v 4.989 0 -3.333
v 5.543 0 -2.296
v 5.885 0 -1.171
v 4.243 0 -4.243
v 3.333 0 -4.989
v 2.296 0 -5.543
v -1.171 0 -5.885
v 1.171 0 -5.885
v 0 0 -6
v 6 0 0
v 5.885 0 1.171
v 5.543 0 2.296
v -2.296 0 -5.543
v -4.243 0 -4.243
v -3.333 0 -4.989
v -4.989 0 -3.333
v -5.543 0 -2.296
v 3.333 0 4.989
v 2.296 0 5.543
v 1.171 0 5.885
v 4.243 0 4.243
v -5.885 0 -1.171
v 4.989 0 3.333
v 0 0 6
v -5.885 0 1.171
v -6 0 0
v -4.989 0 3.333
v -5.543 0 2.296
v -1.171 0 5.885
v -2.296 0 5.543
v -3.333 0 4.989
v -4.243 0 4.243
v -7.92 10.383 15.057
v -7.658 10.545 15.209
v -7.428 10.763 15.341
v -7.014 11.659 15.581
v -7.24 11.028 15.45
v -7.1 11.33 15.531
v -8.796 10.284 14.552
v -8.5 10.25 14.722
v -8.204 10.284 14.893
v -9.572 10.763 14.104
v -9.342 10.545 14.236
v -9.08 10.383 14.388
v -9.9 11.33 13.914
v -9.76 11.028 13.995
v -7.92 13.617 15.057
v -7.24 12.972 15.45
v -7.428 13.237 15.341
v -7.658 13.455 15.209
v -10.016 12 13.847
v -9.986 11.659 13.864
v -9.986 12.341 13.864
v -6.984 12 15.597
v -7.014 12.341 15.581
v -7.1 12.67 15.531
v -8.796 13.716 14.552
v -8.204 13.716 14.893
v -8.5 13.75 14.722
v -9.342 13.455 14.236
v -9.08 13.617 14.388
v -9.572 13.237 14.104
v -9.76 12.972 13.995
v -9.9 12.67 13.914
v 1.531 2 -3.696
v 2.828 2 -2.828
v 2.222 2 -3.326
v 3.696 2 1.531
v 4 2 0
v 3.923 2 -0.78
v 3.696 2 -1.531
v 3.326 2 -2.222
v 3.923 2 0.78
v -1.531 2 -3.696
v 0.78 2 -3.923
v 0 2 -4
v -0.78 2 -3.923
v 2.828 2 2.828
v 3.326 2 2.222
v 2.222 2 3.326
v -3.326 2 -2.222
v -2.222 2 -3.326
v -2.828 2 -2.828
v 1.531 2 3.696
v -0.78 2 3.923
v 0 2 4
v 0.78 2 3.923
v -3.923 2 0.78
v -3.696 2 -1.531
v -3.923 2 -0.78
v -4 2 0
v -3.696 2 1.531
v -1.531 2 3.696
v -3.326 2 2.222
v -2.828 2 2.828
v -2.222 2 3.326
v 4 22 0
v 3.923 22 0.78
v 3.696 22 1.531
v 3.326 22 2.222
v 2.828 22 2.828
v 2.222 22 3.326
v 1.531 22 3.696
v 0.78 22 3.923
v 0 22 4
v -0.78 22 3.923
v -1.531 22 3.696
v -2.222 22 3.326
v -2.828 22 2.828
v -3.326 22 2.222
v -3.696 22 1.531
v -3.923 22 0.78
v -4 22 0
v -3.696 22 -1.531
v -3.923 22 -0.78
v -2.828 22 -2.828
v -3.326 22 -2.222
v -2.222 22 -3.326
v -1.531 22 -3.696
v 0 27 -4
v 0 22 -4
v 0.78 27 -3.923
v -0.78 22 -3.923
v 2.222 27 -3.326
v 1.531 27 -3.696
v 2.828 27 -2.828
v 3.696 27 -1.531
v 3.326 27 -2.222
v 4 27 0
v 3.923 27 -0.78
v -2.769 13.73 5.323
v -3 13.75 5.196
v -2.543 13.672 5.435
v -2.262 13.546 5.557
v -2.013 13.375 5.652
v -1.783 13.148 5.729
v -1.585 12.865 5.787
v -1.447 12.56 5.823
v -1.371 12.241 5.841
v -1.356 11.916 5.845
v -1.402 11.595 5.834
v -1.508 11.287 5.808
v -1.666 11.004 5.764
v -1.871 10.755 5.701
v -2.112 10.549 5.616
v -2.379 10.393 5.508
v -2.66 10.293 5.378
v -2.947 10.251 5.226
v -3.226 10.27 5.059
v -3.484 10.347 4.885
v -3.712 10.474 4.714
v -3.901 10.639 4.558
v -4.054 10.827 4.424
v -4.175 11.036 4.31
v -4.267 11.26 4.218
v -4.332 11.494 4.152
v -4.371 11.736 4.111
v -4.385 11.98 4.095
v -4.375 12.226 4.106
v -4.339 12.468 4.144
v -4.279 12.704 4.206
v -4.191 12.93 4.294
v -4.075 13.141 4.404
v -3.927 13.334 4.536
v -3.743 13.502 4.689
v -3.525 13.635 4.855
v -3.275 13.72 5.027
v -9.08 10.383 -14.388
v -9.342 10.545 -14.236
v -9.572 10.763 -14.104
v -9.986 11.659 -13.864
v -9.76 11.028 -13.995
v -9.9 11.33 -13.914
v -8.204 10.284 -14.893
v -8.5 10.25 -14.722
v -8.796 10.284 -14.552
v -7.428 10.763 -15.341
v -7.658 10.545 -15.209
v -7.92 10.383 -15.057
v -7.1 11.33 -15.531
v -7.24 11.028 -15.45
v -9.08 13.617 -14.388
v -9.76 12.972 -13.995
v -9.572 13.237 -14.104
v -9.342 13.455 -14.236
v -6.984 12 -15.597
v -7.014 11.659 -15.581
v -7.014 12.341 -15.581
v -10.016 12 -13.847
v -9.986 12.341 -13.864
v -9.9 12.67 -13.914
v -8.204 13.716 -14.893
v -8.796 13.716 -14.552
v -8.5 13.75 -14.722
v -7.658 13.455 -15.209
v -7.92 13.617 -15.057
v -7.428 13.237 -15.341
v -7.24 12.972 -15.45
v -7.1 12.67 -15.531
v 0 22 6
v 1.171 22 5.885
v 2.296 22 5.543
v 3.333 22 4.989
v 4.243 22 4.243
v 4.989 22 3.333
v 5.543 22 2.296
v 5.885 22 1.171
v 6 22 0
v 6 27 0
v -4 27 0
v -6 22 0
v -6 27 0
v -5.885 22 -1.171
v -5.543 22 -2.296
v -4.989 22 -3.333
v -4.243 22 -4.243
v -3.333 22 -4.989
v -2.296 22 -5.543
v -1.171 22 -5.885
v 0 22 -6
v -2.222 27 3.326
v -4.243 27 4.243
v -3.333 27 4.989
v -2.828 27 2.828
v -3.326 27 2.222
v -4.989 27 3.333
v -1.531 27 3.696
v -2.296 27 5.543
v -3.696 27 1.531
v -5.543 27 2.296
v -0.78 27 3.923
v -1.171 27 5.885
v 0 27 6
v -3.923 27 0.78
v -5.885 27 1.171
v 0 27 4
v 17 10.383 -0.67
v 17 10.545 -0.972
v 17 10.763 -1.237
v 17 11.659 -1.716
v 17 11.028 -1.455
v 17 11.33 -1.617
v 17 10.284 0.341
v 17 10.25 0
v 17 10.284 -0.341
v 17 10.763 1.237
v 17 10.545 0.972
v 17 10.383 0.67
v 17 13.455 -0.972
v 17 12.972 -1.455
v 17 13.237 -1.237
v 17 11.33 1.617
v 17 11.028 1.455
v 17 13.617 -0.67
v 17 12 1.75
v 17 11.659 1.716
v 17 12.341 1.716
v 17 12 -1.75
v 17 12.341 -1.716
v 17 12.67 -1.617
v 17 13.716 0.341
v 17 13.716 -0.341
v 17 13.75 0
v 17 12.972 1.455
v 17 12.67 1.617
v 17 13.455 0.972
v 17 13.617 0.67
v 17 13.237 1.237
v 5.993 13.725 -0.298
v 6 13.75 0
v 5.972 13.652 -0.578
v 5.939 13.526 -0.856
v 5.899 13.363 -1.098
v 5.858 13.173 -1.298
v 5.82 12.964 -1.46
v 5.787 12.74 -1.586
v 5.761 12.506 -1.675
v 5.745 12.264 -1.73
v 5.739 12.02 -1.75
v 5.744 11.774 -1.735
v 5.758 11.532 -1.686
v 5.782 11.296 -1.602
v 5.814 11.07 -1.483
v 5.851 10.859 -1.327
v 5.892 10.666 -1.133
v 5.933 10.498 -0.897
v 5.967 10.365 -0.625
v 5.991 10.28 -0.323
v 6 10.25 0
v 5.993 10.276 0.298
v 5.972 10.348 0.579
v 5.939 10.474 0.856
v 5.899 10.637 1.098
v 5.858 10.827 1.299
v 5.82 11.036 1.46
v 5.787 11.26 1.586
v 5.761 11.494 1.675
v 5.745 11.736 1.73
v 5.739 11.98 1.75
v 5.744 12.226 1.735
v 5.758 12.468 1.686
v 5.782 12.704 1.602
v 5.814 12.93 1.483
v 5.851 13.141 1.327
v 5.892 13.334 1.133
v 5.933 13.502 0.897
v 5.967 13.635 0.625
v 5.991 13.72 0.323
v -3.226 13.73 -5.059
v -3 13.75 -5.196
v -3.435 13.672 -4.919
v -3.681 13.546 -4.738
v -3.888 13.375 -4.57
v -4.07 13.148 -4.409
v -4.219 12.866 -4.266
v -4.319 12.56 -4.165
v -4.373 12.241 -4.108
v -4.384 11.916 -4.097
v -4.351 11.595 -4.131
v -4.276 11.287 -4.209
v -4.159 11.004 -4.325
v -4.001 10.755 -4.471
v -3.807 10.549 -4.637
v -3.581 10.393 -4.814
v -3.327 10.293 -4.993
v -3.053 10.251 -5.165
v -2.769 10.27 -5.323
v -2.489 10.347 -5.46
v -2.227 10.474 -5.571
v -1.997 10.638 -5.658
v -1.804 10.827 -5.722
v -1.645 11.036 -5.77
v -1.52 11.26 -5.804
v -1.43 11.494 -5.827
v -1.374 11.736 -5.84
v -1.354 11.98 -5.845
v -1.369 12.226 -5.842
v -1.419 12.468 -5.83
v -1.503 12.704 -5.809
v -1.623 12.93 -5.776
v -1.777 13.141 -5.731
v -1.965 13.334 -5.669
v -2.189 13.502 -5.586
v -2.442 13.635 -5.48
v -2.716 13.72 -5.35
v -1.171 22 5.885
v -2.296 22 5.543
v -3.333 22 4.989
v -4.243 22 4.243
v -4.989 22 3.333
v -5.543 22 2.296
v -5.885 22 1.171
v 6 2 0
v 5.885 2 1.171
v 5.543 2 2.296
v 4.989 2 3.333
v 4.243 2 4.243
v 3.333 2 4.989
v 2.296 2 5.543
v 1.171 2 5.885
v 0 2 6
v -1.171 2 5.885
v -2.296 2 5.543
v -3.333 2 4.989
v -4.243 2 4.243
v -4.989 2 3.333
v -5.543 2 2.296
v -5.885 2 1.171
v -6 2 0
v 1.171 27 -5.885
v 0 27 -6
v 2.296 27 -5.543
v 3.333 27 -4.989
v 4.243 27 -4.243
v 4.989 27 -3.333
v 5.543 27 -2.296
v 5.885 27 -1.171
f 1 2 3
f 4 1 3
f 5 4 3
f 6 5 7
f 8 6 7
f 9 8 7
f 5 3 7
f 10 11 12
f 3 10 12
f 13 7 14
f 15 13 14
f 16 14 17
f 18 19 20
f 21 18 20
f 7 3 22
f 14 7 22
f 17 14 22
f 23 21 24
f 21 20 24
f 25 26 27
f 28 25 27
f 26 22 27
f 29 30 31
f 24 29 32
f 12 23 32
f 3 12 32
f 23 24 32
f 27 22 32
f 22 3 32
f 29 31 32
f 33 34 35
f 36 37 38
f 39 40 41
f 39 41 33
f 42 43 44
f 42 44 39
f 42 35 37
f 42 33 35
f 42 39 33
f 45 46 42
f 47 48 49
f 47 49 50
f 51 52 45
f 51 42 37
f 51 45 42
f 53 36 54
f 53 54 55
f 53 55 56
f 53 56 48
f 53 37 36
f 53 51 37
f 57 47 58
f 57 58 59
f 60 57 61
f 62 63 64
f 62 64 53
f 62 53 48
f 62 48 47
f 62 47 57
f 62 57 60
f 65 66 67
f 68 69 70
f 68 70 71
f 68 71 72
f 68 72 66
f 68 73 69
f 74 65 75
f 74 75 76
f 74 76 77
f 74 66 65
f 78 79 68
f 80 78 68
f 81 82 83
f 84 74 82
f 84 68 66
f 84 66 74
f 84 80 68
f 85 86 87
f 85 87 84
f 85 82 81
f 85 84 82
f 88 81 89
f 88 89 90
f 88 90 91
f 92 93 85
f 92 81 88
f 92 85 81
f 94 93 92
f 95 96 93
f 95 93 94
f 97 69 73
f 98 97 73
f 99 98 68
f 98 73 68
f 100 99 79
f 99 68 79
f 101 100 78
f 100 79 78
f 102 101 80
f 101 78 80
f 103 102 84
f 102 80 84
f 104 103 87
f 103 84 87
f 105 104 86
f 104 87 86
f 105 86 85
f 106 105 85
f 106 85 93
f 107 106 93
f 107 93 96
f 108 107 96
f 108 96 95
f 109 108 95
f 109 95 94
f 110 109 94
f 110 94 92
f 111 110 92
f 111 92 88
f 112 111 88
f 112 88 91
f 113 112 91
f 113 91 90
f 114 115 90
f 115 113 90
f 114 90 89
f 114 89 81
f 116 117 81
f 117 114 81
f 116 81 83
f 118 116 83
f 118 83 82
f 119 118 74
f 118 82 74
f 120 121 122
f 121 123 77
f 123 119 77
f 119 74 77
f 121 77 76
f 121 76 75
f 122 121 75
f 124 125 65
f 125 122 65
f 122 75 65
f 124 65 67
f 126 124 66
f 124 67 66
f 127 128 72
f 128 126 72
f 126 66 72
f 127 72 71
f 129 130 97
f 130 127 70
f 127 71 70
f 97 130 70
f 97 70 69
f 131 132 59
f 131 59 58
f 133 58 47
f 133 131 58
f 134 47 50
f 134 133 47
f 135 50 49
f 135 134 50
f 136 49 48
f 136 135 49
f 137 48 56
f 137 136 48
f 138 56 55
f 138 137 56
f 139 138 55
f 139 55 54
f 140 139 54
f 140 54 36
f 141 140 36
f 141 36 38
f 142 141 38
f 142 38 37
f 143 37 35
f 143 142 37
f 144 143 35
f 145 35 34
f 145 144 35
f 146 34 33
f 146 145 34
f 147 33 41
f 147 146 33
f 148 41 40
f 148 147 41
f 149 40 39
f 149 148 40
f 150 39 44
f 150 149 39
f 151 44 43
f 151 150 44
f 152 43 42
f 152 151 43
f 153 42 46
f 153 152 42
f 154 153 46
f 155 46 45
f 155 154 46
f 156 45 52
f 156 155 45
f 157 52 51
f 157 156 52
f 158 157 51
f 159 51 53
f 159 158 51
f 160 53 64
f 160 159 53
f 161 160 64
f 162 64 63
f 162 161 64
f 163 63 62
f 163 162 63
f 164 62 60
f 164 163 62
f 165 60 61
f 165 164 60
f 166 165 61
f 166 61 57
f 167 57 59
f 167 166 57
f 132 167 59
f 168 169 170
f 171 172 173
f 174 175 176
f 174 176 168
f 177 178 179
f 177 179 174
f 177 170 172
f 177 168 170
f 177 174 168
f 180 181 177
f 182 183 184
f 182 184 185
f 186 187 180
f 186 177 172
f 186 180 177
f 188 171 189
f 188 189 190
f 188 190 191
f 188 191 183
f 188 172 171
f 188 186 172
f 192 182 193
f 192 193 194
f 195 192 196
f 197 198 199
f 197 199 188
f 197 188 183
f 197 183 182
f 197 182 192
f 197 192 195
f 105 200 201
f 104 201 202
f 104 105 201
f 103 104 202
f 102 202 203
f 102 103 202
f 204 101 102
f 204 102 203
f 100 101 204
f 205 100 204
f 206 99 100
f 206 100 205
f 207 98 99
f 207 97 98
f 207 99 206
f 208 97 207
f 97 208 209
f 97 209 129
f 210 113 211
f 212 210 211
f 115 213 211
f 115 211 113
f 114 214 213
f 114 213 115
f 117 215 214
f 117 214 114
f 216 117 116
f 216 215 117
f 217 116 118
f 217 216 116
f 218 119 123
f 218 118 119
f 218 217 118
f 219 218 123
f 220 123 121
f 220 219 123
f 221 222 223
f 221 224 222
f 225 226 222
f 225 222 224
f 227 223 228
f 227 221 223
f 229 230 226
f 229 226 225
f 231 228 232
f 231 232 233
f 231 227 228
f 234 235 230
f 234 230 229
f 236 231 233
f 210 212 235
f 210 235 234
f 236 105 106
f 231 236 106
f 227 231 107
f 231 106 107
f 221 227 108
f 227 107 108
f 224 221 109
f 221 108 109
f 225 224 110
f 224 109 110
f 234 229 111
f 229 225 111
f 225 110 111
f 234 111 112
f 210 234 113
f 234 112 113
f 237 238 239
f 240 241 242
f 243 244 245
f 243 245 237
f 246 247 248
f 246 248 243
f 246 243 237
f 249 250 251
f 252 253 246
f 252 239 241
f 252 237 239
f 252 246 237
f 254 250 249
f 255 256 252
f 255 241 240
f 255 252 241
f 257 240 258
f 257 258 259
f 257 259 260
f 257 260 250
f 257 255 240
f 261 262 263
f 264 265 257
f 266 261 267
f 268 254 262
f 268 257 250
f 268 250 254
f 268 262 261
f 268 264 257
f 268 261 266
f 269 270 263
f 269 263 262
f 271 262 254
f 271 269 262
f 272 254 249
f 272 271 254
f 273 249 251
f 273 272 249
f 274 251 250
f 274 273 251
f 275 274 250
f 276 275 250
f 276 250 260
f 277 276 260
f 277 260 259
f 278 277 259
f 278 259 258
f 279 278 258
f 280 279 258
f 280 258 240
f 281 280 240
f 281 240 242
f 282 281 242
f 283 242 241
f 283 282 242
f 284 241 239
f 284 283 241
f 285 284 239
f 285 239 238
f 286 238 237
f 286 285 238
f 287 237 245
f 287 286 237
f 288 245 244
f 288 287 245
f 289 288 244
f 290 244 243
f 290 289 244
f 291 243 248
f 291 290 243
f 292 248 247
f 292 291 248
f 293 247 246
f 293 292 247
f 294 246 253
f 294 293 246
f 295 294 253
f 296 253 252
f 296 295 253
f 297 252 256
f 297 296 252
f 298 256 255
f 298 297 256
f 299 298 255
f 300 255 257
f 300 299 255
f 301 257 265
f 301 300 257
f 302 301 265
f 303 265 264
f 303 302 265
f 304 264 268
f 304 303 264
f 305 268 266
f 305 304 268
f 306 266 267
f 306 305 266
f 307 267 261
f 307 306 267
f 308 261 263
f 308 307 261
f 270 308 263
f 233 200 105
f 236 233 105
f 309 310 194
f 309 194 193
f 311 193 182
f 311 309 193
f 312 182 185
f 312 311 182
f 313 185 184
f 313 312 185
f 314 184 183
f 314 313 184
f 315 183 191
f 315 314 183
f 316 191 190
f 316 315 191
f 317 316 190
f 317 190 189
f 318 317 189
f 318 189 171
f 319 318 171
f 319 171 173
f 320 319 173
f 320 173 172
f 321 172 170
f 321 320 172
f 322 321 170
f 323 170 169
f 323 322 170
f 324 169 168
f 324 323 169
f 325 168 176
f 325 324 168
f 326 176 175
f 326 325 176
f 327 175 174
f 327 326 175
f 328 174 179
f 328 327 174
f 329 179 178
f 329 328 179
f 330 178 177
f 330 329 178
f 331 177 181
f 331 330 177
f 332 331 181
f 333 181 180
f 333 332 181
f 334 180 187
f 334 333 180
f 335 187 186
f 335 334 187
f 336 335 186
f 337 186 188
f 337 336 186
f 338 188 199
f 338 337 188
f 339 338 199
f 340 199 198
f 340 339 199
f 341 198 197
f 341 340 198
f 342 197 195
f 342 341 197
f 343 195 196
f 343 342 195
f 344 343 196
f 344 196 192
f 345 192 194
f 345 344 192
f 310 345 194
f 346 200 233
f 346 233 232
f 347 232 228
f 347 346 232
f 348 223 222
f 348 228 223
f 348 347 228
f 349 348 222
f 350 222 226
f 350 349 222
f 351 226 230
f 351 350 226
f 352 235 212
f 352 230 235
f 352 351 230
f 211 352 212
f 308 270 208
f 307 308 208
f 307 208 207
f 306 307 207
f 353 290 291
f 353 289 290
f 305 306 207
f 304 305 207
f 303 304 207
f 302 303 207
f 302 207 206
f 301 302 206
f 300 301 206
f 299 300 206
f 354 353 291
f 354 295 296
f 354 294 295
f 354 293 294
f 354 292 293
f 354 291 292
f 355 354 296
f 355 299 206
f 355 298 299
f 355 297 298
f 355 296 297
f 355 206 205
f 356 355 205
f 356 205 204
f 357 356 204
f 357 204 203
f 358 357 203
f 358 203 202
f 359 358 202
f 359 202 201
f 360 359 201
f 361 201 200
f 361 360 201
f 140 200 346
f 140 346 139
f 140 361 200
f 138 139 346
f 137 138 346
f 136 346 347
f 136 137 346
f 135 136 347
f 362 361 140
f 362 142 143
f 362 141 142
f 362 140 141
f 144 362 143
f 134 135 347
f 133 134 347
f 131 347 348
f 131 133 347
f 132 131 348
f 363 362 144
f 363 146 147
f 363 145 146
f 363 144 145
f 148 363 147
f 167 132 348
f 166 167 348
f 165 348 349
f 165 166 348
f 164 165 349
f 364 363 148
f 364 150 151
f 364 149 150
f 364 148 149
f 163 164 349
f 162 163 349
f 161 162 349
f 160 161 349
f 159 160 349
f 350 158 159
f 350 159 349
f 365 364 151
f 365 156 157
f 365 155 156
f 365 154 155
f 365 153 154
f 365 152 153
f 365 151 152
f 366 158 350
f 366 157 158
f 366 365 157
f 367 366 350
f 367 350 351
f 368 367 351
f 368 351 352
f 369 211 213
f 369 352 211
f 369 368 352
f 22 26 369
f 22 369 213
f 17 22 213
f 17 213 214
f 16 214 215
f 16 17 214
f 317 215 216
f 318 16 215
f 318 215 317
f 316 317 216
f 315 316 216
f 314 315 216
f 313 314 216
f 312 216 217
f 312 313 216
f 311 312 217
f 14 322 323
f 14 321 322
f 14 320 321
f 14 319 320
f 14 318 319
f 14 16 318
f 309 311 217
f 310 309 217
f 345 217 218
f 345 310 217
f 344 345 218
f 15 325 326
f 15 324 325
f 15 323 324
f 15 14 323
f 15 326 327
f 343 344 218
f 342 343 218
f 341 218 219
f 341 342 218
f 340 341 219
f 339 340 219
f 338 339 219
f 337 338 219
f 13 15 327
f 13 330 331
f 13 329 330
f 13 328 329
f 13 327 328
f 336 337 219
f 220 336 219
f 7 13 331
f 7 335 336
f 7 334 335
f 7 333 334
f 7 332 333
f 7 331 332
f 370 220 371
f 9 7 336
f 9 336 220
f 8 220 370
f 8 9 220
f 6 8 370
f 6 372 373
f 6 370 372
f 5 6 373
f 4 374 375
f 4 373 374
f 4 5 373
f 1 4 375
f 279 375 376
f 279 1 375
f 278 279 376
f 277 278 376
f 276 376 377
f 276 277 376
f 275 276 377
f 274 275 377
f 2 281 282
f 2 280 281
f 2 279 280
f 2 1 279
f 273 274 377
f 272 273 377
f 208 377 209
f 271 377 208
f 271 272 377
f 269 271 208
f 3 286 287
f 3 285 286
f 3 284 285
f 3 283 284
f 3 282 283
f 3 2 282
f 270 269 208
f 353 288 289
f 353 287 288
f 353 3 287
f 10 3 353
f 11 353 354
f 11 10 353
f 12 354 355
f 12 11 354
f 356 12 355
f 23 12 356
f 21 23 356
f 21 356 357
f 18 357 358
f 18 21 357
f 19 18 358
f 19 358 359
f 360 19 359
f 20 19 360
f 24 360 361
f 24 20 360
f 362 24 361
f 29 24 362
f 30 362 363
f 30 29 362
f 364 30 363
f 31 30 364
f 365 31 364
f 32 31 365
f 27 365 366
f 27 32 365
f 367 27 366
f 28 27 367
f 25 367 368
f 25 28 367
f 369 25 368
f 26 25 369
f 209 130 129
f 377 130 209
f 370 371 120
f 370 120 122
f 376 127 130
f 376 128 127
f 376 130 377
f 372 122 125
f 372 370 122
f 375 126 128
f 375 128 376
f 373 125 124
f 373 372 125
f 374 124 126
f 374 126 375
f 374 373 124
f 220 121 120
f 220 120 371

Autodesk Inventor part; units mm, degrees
ref_plane "XZ Plane" through (0, 0, 0) normal (0, 1, 0) x (-1, 0, 0)
ref_plane "XY Plane" through (0, 0, 0) normal (0, 0, 1) x (1, 0, 0)
sketch "Sketch1" plane through (0, 0, 0) normal (0, 1, 0) x (-1, 0, 0)
  circle A0 centre (0, 0) radius 6
  dimension "d0" = 12
extrude "Extrusion1" add sketch "Sketch1" along normal blind 2
sketch "Sketch2" plane through (0, 2, 0) normal (0, 1, 0) x (1, 0, 0)
  circle A0 centre (0, 0) radius 4
  circle A1 centre (0, 0) radius 6
  dimension "d3" = 8
extrude "Extrusion2" add sketch "Sketch2" along normal blind 20
sketch "Sketch3" plane through (0, 22, 0) normal (0, 1, 0) x (1, 0, 0)
  arc A0 (-6, 0) -> (0, -6) centre (0, 0) ccw
  circle A1 centre (0, 0) radius 6 construction
  arc A2 (6, 0) -> (0, 6) centre (0, 0) ccw
  line L0 (0, -6) -> (0, -4)
  circle A3 centre (0, 0) radius 4 construction
  line L1 (0, 4) -> (0, 6)
  line L2 (6, 0) -> (4, 0)
  line L3 (-4, 0) -> (-6, 0)
  arc A4 (-4, 0) -> (0, -4) centre (0, 0) ccw
  arc A5 (4, 0) -> (0, 4) centre (0, 0) ccw
extrude "Extrusion3" add sketch "Sketch3" along normal blind 5
ref_plane "Work Plane1" through (5, 0, 0) normal (1, 0, 0) x (0, 1, 0)
sketch "Sketch5" plane through (5, 0, 0) normal (1, 0, 0) x (0, 1, 0)
  line L0 (22, 0) -> (22, 6) construction
  line L1 (22, 6) -> (2, -6) construction
  line L2 (22, -6) -> (22, 0) construction
  line L3 (22, -6) -> (2, 6) construction
  circle A0 centre (12, 0) radius 1.75
  point P0 (0, 0)
  dimension "d10" = 3.5
extrude "Extrusion4" add sketch "Sketch5" along normal blind 12
pattern_circular "Circular Pattern1" count 3 over 360 about axis through (0, 0, 0) along (0, 1, 0) of "Extrusion4"
thread "Thread1" size "M3.5x0.6" class "6g" standard "ANSI Metric M Profile" length 10
thread "Thread2" size "M3.5x0.6" class "6g" standard "ANSI Metric M Profile" length 10
thread "Thread3" size "M3.5x0.6" class "6g" standard "ANSI Metric M Profile" length 10
properties part number "UntererRührerHalter"
